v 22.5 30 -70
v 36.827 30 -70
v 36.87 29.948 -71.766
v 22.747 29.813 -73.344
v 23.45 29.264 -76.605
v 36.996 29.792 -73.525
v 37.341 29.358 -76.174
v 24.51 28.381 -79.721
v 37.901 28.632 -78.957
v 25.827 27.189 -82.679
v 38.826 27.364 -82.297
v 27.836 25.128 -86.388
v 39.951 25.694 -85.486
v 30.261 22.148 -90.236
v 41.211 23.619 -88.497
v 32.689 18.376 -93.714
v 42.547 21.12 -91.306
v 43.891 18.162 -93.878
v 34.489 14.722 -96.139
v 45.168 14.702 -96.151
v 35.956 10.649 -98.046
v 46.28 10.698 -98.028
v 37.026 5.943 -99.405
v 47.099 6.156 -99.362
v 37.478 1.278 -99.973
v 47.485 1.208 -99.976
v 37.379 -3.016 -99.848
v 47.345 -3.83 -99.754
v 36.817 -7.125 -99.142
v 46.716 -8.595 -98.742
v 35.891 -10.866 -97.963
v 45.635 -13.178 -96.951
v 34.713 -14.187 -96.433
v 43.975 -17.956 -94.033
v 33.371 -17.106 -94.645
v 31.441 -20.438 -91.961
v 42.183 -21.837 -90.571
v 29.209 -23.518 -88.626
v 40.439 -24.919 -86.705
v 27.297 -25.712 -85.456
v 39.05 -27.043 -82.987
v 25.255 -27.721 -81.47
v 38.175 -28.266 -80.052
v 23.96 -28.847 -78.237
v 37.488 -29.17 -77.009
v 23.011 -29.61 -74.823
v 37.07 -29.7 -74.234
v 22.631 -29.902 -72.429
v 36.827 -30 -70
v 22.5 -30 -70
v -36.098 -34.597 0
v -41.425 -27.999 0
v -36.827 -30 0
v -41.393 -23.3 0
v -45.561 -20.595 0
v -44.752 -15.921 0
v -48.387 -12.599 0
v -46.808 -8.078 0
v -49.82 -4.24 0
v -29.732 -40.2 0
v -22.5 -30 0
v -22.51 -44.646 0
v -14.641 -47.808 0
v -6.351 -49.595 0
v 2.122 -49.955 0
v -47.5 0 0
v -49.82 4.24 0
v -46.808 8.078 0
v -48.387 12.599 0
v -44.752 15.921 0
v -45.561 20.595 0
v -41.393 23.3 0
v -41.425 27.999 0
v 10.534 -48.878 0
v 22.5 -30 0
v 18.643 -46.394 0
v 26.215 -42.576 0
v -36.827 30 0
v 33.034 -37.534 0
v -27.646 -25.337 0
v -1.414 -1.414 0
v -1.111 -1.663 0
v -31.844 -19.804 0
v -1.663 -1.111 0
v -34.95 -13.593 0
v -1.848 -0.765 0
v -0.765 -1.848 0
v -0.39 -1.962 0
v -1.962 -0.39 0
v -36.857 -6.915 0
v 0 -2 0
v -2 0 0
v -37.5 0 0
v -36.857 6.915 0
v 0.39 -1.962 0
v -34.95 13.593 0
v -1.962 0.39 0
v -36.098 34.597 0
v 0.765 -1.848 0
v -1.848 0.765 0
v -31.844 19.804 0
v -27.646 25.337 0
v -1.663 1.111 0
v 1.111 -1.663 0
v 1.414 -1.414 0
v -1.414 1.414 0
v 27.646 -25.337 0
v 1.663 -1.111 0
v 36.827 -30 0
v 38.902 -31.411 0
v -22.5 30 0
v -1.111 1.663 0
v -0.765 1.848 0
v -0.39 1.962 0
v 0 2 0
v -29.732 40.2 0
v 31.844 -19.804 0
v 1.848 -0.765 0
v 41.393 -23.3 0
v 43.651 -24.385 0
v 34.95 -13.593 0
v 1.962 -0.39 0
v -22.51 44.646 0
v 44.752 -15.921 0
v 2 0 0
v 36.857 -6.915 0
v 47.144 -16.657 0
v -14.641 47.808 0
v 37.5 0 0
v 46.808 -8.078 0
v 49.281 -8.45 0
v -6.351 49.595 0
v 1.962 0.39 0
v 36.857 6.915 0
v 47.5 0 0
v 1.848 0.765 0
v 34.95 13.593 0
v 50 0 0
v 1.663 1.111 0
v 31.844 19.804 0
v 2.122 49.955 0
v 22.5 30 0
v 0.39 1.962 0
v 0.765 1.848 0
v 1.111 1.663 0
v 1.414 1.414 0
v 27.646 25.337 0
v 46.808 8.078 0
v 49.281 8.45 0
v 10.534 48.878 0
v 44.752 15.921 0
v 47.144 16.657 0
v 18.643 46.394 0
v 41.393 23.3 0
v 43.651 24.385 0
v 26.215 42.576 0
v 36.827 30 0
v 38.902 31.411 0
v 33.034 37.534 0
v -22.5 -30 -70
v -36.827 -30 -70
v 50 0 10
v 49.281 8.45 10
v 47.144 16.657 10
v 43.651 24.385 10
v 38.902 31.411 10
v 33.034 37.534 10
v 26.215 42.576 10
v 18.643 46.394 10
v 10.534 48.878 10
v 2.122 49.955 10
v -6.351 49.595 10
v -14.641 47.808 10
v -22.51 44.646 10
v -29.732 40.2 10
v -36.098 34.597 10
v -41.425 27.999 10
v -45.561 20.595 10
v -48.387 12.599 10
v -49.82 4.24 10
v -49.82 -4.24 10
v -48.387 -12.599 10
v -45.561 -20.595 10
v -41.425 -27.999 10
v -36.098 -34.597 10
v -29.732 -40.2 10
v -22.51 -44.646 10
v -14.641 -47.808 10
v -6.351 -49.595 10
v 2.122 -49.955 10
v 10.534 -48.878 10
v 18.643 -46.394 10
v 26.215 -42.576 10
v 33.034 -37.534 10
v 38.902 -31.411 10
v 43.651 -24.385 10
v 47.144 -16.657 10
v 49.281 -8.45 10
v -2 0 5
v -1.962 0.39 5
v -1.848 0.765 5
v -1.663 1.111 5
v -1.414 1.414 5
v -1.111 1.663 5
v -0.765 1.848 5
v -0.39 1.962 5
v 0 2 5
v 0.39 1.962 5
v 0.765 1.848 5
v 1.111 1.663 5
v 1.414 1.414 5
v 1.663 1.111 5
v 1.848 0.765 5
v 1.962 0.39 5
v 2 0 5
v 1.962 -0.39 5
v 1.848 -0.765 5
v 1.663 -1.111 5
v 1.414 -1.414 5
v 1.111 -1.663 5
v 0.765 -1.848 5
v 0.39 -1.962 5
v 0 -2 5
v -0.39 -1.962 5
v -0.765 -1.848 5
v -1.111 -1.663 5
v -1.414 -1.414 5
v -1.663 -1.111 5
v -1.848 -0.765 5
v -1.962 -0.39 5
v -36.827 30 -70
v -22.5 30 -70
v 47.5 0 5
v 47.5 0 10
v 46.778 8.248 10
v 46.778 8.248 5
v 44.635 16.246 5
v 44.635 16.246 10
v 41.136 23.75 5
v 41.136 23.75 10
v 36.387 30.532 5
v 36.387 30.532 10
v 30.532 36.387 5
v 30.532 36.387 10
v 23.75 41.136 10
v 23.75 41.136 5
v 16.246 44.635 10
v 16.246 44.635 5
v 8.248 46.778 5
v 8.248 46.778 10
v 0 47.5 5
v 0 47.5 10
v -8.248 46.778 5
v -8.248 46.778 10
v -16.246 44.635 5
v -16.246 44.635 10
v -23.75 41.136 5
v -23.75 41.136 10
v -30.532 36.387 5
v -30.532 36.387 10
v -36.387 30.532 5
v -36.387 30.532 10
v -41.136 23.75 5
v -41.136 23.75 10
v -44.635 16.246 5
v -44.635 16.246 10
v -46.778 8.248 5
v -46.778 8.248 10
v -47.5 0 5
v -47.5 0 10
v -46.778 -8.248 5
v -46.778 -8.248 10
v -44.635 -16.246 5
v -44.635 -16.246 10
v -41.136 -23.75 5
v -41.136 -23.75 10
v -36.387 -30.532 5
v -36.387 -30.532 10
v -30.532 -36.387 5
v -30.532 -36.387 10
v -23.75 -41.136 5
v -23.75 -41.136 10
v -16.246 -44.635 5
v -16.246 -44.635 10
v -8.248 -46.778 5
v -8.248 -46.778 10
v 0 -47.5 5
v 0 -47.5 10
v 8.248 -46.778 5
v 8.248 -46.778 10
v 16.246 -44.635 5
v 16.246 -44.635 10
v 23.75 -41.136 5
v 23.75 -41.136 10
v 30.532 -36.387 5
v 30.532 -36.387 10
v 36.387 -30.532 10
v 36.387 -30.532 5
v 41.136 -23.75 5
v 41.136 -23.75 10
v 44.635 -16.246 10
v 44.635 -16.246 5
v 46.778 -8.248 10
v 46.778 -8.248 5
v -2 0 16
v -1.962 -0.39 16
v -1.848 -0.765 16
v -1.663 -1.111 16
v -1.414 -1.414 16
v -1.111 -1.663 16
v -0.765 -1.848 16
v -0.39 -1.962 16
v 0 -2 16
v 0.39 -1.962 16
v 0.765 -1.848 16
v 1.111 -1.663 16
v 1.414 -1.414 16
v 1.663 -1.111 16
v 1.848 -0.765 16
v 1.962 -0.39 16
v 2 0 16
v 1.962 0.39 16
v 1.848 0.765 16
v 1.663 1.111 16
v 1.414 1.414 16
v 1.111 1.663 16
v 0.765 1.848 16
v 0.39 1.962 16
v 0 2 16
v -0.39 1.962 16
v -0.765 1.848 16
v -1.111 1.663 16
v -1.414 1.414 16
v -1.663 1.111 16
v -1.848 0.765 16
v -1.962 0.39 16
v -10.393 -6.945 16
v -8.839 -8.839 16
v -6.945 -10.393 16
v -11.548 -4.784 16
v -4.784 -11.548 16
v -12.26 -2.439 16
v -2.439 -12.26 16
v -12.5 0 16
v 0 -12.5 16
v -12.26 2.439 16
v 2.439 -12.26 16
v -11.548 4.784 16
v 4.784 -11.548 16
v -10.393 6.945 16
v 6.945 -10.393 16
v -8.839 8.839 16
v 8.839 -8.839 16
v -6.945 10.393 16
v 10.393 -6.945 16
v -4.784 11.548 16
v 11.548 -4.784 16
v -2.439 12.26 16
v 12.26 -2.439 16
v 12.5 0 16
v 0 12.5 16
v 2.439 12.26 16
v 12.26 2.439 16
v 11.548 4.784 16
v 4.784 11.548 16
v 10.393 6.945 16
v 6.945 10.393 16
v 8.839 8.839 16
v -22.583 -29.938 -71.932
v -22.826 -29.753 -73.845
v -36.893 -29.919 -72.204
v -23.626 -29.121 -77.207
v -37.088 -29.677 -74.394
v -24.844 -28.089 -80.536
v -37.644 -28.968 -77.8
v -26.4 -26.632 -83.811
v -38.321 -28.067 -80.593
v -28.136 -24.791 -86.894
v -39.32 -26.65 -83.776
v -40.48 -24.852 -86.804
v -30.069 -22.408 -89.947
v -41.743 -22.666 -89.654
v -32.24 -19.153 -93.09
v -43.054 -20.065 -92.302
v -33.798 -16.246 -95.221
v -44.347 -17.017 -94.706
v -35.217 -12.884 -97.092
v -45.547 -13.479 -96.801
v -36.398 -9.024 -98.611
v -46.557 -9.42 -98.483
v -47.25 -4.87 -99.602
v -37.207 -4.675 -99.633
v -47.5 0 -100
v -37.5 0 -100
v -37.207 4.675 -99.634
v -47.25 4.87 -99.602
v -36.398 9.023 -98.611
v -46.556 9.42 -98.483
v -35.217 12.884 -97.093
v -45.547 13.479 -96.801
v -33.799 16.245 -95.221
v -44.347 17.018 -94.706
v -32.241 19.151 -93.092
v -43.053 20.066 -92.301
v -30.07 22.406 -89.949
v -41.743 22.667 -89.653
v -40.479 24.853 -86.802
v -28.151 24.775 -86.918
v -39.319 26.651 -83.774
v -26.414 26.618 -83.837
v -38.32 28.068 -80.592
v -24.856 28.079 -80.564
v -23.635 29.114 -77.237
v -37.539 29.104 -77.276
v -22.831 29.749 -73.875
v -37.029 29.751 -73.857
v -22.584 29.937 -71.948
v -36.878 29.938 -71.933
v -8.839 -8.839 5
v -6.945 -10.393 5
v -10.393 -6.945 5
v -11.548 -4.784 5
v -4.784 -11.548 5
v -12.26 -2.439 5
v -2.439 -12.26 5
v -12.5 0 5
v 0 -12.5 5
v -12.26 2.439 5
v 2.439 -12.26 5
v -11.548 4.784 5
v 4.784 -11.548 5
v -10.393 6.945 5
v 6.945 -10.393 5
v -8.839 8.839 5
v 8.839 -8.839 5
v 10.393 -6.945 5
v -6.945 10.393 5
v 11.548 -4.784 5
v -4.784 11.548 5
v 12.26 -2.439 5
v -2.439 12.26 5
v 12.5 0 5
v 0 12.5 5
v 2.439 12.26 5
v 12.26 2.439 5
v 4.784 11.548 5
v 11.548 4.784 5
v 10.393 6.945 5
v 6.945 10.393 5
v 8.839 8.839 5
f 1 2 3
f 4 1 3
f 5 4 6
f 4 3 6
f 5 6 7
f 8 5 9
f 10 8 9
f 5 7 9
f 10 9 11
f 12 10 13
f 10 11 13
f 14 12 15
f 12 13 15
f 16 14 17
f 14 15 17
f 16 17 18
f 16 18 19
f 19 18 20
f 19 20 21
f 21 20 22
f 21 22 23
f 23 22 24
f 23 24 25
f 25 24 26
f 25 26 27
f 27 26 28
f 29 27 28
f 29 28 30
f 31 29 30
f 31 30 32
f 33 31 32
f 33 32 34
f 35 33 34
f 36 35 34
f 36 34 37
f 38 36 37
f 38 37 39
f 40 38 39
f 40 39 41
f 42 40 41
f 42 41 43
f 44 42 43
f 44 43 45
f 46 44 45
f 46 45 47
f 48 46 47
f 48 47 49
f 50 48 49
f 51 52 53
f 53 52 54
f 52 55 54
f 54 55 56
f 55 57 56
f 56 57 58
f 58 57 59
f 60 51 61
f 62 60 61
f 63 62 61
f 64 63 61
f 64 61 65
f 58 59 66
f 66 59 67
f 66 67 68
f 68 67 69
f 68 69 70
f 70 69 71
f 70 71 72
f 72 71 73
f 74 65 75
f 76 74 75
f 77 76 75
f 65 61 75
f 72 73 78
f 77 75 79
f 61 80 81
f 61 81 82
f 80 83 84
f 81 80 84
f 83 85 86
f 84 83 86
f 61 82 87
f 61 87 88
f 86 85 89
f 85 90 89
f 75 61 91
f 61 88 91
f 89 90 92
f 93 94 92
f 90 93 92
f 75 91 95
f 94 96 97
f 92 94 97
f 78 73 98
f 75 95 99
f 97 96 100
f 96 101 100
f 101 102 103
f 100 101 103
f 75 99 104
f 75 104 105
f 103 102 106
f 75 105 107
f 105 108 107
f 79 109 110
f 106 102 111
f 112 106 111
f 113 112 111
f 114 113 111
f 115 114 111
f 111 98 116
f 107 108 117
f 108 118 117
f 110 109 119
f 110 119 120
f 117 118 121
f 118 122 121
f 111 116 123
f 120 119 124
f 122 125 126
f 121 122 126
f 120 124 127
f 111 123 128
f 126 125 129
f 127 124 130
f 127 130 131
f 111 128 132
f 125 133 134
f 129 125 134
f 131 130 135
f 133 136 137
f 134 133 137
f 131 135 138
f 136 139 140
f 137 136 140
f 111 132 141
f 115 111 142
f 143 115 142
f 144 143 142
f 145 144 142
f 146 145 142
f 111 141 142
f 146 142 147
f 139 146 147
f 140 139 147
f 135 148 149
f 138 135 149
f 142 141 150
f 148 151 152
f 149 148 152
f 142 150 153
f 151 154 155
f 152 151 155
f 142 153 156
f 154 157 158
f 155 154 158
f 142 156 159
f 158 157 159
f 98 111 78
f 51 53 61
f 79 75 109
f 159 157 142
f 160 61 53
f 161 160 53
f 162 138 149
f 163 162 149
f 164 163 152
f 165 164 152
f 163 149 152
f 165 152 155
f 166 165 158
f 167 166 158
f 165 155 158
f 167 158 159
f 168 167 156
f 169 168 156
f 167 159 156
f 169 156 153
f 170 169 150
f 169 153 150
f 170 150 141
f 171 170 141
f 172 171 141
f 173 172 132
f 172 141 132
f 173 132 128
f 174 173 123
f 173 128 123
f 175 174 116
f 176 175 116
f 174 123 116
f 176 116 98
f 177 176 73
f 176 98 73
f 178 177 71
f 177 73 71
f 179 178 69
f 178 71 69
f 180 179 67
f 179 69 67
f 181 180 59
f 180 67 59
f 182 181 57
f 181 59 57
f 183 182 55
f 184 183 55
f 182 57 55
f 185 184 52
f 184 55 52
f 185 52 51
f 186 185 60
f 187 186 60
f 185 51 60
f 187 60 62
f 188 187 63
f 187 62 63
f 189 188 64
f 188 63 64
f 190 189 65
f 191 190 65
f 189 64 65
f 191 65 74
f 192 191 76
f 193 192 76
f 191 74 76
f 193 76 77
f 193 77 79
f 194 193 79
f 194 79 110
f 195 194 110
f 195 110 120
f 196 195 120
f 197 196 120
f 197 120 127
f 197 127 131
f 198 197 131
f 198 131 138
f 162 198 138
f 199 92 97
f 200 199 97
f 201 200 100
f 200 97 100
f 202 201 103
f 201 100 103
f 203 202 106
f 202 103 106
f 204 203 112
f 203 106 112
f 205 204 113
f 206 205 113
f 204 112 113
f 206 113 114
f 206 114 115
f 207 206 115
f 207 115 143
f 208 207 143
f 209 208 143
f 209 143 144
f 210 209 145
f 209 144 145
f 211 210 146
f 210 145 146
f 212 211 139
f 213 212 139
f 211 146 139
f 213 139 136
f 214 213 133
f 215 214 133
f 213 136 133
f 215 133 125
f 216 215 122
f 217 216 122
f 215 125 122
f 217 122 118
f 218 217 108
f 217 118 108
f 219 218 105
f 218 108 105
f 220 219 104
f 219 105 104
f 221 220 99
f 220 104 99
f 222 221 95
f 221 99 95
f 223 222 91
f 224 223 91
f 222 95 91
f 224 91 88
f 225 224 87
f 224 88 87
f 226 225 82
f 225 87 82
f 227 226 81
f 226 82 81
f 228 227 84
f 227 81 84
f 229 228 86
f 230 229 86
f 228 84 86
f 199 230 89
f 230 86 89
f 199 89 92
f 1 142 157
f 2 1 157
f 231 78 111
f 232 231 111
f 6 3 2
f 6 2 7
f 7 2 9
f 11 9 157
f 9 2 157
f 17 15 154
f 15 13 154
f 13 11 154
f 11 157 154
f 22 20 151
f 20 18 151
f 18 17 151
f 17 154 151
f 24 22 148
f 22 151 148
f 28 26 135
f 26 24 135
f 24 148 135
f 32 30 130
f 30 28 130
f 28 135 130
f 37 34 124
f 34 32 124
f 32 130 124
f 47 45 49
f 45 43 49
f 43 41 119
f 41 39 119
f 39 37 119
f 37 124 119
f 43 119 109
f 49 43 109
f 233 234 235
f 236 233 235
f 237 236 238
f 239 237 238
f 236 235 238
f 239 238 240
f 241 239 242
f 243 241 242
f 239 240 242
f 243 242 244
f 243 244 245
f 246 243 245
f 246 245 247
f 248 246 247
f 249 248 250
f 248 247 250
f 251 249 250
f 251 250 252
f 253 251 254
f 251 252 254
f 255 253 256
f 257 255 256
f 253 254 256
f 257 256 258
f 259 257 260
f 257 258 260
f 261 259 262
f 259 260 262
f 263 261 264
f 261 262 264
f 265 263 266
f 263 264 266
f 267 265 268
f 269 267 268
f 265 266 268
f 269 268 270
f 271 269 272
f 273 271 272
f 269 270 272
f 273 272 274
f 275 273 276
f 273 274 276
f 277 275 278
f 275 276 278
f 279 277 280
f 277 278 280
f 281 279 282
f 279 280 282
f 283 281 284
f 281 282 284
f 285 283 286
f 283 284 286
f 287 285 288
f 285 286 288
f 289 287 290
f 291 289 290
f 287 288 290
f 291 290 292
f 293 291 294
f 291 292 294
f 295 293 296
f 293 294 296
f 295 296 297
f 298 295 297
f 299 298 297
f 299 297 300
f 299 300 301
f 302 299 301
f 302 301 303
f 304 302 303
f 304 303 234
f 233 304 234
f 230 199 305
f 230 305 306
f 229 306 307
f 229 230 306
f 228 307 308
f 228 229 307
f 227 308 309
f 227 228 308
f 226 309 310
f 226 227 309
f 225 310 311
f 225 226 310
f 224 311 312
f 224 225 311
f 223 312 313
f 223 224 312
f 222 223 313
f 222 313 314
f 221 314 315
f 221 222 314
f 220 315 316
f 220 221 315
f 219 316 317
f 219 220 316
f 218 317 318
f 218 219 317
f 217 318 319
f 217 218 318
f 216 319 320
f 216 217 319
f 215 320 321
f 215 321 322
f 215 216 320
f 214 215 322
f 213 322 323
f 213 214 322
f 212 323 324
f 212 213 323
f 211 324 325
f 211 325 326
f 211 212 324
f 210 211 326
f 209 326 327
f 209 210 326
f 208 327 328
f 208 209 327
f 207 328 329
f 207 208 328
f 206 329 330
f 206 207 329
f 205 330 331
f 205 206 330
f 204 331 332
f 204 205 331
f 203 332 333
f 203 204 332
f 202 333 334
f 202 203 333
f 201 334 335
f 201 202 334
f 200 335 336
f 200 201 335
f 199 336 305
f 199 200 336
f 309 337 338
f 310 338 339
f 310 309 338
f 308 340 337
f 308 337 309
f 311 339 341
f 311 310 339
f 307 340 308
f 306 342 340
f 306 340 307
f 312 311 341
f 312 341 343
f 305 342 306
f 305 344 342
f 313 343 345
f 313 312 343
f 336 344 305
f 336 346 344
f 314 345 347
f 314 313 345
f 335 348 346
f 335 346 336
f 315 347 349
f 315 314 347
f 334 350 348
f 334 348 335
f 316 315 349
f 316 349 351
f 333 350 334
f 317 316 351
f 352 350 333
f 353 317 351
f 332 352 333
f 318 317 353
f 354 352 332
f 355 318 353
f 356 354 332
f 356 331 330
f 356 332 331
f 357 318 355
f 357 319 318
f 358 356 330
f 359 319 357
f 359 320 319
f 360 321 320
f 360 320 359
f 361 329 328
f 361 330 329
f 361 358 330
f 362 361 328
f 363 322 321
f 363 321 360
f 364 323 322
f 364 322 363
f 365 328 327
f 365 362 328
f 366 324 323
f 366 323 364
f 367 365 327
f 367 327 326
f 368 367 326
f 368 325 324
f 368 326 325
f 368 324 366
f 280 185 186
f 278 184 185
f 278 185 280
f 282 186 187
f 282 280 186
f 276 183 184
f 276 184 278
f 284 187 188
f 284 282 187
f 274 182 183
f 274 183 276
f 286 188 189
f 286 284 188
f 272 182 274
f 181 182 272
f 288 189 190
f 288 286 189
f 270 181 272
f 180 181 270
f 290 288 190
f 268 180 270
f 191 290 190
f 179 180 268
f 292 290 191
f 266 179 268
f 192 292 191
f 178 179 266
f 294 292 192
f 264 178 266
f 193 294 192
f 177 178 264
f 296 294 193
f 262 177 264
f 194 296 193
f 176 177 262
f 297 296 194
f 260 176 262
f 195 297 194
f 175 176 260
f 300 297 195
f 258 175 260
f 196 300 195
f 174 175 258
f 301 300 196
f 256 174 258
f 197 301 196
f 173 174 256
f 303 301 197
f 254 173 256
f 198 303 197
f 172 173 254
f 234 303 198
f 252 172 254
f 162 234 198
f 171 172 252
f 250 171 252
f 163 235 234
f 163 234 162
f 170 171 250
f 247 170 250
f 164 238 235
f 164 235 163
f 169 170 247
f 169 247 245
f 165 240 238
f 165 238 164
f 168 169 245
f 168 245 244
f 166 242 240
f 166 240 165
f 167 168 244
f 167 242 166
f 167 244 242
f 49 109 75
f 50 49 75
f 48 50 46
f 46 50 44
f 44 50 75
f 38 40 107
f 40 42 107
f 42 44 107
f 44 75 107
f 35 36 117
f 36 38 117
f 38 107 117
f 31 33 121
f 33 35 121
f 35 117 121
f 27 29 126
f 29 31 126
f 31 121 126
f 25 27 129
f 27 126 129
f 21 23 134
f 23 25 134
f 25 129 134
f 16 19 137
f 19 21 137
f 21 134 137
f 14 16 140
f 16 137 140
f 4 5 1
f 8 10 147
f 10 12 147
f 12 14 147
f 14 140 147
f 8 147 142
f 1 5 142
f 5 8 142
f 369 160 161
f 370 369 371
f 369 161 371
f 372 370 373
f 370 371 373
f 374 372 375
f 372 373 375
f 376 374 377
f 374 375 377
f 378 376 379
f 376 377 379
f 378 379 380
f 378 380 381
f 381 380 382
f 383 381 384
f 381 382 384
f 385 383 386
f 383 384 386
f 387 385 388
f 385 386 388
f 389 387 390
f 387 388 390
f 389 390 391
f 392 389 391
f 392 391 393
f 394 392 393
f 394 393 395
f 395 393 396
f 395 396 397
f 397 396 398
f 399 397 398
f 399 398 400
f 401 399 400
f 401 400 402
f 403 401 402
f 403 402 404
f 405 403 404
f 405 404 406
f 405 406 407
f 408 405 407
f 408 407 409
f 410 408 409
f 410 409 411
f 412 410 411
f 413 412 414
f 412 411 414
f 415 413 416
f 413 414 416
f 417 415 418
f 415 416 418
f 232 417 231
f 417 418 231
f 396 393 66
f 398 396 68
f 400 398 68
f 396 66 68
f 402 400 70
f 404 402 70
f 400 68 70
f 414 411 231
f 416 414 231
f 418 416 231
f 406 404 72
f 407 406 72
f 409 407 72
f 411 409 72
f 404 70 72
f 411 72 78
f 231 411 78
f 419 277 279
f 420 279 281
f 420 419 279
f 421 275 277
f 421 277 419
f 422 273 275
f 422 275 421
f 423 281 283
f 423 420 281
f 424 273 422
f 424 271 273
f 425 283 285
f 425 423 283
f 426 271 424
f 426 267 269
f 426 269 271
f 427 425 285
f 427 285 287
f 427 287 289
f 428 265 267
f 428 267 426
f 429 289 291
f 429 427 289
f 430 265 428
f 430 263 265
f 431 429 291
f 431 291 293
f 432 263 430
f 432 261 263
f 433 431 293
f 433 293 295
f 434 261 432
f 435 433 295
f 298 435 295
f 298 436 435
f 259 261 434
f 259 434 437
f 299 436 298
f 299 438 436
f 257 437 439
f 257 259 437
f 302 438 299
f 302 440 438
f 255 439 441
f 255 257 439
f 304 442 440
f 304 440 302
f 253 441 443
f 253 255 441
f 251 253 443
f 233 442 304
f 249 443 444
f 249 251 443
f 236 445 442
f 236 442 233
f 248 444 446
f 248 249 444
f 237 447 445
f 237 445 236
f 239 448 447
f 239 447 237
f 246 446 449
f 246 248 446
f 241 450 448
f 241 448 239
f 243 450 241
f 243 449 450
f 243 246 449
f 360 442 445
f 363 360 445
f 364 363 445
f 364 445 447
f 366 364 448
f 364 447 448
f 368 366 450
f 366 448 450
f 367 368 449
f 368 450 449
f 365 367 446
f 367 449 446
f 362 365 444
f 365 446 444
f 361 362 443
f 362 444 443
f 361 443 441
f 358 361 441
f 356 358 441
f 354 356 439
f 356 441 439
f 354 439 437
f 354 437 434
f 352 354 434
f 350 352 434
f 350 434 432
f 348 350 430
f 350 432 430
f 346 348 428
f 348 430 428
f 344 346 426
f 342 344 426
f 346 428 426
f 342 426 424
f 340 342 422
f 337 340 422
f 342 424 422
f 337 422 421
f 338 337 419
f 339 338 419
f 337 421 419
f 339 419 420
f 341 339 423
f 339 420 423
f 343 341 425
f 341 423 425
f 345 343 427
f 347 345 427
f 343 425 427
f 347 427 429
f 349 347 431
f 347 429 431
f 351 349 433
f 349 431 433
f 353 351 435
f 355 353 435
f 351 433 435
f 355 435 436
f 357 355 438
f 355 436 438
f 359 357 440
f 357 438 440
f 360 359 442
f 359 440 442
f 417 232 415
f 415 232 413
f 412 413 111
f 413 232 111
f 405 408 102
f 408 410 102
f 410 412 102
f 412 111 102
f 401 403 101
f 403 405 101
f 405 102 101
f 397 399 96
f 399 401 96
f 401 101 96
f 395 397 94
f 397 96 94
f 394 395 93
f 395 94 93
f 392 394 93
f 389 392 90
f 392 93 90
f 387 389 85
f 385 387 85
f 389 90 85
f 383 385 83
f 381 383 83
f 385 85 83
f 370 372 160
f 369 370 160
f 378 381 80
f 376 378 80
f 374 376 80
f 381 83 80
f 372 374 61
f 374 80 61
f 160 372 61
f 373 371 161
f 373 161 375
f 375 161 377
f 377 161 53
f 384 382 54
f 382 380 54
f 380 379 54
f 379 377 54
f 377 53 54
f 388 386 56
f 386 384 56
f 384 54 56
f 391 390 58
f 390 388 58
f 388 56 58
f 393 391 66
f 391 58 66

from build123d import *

# Parameters (mm, degrees)
ESQUISSE1_R             = 50
BOSS_EXTRU_1_DEPTH      = 10
ESQUISSE2_R             = 47.5
ENL_V_MAT_EXTRU_1_DEPTH = 5
ESQUISSE3_R             = 2
ENL_V_MAT_EXTRU_2_DEPTH = 5
BOSS_EXTRU_2_DEPTH      = 100
CONG_1_R                = 30
ESQUISSE5_R             = 12.5
BOSS_EXTRU_3_DEPTH      = 11
ENL_V_START             = -11
ESQUISSE6_R             = 2
ENL_V_MAT_EXTRU_3_DEPTH = 11


with BuildPart() as part:
    # Esquisse1 → Boss.-Extru.1 (new body)
    with BuildSketch(Plane.XY):
        Circle(ESQUISSE1_R)
    extrude(amount=BOSS_EXTRU_1_DEPTH)

    # Esquisse2 → Enlèv. mat.-Extru.1 (cut)
    with BuildSketch(Plane.XY.offset(10)):
        Circle(ESQUISSE2_R)
    extrude(amount=-ENL_V_MAT_EXTRU_1_DEPTH, mode=Mode.SUBTRACT)

    # Esquisse3 → Enlèv. mat.-Extru.2 (cut)
    with BuildSketch(Plane(origin=(0, 0, 0), x_dir=(-1, 0, 0), z_dir=(0, 0, -1))):
        Circle(ESQUISSE3_R)
    extrude(amount=-ENL_V_MAT_EXTRU_2_DEPTH, mode=Mode.SUBTRACT)

    # Esquisse4 → Boss.-Extru.2 (add)
    with BuildSketch(Plane(origin=(0, 0, 0), x_dir=(-1, 0, 0), z_dir=(0, 0, -1))):
        with BuildLine():
            ThreePointArc((-22.5, -30), (-37.5, 0), (-22.5, 30))
            Line((-22.5, 30), (-36.827299657, 30))
            ThreePointArc((-36.827299657, 30), (-47.5, 0), (-36.827299657, -30))
            Line((-36.827299657, -30), (-22.5, -30))
        make_face()
        with BuildLine():
            Line((36.827299657, 30), (22.5, 30))
            ThreePointArc((22.5, 30), (33.541019662, 16.770509831), (37.5, 0))
            ThreePointArc((37.5, 0), (33.541019662, -16.770509831), (22.5, -30))
            Line((22.5, -30), (36.827299657, -30))
            ThreePointArc((36.827299657, -30), (44.752355992, -15.920949505), (47.5, 0))
            ThreePointArc((47.5, 0), (44.752355992, 15.920949505), (36.827299657, 30))
        make_face()
    extrude(amount=BOSS_EXTRU_2_DEPTH)

    # Congé1
    # the kernel refuses this fillet: 30 mm, written as the material it takes off along each edge
    with BuildSketch(Plane(origin=(111.827299657, -30, -100), x_dir=(0, 0, 1), z_dir=(-1, 0, 0)), Plane(origin=(-52.5, 30, -100), x_dir=(0, 0, 1), z_dir=(1, 0, 0)), Plane(origin=(52.5, -30, -100), x_dir=(0, 0, 1), z_dir=(-1, 0, 0)), Plane(origin=(-111.827299657, 30, -100), x_dir=(0, 0, 1), z_dir=(1, 0, 0))) as cong_1_piece_1:
        with BuildLine():
            CenterArc((CONG_1_R, CONG_1_R), CONG_1_R, 180, 90)
            Line((0, CONG_1_R), (0, 0))
            Line((0, 0), (CONG_1_R, 0))
        make_face()
    extrude(amount=164.327299657, mode=Mode.SUBTRACT)

    # Esquisse5 → Boss.-Extru.3 (add)
    with BuildSketch(Plane.XY.offset(5)):
        Circle(ESQUISSE5_R)
    extrude(amount=BOSS_EXTRU_3_DEPTH)

    # Esquisse6 → Enlèv. mat.-Extru.3 (cut)
    with BuildSketch(Plane.XY.offset(16).offset(ENL_V_START)):
        with Locations(Location((0, 0, 0), (0, 0, 180))):
            Circle(ESQUISSE6_R)
    extrude(amount=ENL_V_MAT_EXTRU_3_DEPTH, mode=Mode.SUBTRACT)


solid = part.part
